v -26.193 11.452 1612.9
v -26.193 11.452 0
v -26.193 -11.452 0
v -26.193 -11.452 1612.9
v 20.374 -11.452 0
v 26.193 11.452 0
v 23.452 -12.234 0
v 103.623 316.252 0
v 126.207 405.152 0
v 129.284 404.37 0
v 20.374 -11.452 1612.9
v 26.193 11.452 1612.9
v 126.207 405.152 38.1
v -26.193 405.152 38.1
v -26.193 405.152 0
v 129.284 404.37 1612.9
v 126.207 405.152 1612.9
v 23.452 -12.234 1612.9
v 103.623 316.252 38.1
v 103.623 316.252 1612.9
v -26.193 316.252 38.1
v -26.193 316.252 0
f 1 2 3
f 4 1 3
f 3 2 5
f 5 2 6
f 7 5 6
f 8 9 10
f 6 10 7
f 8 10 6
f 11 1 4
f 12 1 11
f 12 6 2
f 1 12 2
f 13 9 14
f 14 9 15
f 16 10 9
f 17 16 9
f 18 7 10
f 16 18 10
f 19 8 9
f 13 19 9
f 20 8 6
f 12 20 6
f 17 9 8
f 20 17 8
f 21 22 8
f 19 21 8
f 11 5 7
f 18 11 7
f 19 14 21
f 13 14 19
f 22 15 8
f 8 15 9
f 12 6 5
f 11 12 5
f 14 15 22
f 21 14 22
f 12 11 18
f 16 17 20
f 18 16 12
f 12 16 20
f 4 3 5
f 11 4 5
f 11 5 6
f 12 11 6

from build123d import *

# Parameters (mm, degrees)
F1_DEPTH = 1612.9
F2_DEPTH = 38.1
F3_DEPTH = 1612.9


with BuildPart() as f1:
    # F0 (on Top) → F1 (new body)
    with BuildSketch(Plane.XY):
        Polygon((-26.192827, 11.452037), (-26.192827, -11.452037), (20.374346, -11.452037), (26.192827, 11.452037), align=None)
    extrude(amount=F1_DEPTH)


with BuildPart() as f2:
    # F0 (on Top) → F2 (new body)
    with BuildSketch(Plane.XY):
        Polygon((-26.192827, 316.252037), (103.623289, 316.252037), (126.207173, 405.152037), (-26.192827, 405.152037), align=None)
    extrude(amount=F2_DEPTH)


with BuildPart() as f3:
    # F0 (on Top) → F3 (new body)
    with BuildSketch(Plane.XY):
        Polygon((26.192827, 11.452037), (20.374346, -11.452037), (23.451603, -12.233774), (129.284431, 404.3703), (126.207173, 405.152037), (103.623289, 316.252037), align=None)
    extrude(amount=F3_DEPTH)


solid = Compound([f1.part, f2.part, f3.part])
